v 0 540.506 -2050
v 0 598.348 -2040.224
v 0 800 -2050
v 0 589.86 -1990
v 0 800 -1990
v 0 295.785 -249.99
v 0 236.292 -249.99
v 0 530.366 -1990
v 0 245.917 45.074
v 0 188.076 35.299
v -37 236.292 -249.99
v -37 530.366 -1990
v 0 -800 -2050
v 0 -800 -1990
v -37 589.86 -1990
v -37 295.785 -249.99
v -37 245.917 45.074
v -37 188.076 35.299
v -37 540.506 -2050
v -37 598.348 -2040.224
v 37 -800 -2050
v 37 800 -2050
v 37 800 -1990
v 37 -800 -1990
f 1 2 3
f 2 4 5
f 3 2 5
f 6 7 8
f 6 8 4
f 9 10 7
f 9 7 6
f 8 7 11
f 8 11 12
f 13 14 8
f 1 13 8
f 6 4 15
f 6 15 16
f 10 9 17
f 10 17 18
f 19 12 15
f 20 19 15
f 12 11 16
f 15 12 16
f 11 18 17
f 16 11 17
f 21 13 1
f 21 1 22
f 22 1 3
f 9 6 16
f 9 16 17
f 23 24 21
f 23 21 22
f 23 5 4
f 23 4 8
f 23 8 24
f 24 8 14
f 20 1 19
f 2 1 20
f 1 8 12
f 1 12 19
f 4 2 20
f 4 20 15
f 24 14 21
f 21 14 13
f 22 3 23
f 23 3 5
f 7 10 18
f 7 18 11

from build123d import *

# Parameters (mm, degrees)
F1_DEPTH = 37
F2_DEPTH = 37


with BuildPart() as f1:
    # F0 (on Right) → F1 (new body)
    with BuildSketch(Plane.YZ):
        Polygon((-600, -2050), (-589.859565, -1990), (-800, -1990), (-800, -2050), align=None)
        Polygon((0, -1990), (-589.859565, -1990), (-600, -2050), (0, -2050), align=None)
        Polygon((530.365877, -1990), (0, -1990), (0, -2050), (540.506312, -2050), align=None)
        Polygon((589.859565, -1990), (530.365877, -1990), (540.506312, -2050), (598.347846, -2040.224362), align=None)
        Polygon((800, -1990), (589.859565, -1990), (598.347846, -2040.224362), (600, -2050), (800, -2050), align=None)
        Polygon((598.347846, -2040.224362), (540.506312, -2050), (600, -2050), align=None)
    extrude(amount=F1_DEPTH)

    # F0 (on Right) → F2 (join)
    with BuildSketch(Plane.YZ):
        Polygon((188.075704, 35.298803), (236.291578, -249.989995), (295.785267, -249.989995), (245.917239, 45.074441), align=None)
        Polygon((295.785267, -249.989995), (236.291578, -249.989995), (530.365877, -1990), (589.859565, -1990), align=None)
        Polygon((589.859565, -1990), (530.365877, -1990), (540.506312, -2050), (598.347846, -2040.224362), align=None)
    extrude(amount=-F2_DEPTH)


solid = f1.part
